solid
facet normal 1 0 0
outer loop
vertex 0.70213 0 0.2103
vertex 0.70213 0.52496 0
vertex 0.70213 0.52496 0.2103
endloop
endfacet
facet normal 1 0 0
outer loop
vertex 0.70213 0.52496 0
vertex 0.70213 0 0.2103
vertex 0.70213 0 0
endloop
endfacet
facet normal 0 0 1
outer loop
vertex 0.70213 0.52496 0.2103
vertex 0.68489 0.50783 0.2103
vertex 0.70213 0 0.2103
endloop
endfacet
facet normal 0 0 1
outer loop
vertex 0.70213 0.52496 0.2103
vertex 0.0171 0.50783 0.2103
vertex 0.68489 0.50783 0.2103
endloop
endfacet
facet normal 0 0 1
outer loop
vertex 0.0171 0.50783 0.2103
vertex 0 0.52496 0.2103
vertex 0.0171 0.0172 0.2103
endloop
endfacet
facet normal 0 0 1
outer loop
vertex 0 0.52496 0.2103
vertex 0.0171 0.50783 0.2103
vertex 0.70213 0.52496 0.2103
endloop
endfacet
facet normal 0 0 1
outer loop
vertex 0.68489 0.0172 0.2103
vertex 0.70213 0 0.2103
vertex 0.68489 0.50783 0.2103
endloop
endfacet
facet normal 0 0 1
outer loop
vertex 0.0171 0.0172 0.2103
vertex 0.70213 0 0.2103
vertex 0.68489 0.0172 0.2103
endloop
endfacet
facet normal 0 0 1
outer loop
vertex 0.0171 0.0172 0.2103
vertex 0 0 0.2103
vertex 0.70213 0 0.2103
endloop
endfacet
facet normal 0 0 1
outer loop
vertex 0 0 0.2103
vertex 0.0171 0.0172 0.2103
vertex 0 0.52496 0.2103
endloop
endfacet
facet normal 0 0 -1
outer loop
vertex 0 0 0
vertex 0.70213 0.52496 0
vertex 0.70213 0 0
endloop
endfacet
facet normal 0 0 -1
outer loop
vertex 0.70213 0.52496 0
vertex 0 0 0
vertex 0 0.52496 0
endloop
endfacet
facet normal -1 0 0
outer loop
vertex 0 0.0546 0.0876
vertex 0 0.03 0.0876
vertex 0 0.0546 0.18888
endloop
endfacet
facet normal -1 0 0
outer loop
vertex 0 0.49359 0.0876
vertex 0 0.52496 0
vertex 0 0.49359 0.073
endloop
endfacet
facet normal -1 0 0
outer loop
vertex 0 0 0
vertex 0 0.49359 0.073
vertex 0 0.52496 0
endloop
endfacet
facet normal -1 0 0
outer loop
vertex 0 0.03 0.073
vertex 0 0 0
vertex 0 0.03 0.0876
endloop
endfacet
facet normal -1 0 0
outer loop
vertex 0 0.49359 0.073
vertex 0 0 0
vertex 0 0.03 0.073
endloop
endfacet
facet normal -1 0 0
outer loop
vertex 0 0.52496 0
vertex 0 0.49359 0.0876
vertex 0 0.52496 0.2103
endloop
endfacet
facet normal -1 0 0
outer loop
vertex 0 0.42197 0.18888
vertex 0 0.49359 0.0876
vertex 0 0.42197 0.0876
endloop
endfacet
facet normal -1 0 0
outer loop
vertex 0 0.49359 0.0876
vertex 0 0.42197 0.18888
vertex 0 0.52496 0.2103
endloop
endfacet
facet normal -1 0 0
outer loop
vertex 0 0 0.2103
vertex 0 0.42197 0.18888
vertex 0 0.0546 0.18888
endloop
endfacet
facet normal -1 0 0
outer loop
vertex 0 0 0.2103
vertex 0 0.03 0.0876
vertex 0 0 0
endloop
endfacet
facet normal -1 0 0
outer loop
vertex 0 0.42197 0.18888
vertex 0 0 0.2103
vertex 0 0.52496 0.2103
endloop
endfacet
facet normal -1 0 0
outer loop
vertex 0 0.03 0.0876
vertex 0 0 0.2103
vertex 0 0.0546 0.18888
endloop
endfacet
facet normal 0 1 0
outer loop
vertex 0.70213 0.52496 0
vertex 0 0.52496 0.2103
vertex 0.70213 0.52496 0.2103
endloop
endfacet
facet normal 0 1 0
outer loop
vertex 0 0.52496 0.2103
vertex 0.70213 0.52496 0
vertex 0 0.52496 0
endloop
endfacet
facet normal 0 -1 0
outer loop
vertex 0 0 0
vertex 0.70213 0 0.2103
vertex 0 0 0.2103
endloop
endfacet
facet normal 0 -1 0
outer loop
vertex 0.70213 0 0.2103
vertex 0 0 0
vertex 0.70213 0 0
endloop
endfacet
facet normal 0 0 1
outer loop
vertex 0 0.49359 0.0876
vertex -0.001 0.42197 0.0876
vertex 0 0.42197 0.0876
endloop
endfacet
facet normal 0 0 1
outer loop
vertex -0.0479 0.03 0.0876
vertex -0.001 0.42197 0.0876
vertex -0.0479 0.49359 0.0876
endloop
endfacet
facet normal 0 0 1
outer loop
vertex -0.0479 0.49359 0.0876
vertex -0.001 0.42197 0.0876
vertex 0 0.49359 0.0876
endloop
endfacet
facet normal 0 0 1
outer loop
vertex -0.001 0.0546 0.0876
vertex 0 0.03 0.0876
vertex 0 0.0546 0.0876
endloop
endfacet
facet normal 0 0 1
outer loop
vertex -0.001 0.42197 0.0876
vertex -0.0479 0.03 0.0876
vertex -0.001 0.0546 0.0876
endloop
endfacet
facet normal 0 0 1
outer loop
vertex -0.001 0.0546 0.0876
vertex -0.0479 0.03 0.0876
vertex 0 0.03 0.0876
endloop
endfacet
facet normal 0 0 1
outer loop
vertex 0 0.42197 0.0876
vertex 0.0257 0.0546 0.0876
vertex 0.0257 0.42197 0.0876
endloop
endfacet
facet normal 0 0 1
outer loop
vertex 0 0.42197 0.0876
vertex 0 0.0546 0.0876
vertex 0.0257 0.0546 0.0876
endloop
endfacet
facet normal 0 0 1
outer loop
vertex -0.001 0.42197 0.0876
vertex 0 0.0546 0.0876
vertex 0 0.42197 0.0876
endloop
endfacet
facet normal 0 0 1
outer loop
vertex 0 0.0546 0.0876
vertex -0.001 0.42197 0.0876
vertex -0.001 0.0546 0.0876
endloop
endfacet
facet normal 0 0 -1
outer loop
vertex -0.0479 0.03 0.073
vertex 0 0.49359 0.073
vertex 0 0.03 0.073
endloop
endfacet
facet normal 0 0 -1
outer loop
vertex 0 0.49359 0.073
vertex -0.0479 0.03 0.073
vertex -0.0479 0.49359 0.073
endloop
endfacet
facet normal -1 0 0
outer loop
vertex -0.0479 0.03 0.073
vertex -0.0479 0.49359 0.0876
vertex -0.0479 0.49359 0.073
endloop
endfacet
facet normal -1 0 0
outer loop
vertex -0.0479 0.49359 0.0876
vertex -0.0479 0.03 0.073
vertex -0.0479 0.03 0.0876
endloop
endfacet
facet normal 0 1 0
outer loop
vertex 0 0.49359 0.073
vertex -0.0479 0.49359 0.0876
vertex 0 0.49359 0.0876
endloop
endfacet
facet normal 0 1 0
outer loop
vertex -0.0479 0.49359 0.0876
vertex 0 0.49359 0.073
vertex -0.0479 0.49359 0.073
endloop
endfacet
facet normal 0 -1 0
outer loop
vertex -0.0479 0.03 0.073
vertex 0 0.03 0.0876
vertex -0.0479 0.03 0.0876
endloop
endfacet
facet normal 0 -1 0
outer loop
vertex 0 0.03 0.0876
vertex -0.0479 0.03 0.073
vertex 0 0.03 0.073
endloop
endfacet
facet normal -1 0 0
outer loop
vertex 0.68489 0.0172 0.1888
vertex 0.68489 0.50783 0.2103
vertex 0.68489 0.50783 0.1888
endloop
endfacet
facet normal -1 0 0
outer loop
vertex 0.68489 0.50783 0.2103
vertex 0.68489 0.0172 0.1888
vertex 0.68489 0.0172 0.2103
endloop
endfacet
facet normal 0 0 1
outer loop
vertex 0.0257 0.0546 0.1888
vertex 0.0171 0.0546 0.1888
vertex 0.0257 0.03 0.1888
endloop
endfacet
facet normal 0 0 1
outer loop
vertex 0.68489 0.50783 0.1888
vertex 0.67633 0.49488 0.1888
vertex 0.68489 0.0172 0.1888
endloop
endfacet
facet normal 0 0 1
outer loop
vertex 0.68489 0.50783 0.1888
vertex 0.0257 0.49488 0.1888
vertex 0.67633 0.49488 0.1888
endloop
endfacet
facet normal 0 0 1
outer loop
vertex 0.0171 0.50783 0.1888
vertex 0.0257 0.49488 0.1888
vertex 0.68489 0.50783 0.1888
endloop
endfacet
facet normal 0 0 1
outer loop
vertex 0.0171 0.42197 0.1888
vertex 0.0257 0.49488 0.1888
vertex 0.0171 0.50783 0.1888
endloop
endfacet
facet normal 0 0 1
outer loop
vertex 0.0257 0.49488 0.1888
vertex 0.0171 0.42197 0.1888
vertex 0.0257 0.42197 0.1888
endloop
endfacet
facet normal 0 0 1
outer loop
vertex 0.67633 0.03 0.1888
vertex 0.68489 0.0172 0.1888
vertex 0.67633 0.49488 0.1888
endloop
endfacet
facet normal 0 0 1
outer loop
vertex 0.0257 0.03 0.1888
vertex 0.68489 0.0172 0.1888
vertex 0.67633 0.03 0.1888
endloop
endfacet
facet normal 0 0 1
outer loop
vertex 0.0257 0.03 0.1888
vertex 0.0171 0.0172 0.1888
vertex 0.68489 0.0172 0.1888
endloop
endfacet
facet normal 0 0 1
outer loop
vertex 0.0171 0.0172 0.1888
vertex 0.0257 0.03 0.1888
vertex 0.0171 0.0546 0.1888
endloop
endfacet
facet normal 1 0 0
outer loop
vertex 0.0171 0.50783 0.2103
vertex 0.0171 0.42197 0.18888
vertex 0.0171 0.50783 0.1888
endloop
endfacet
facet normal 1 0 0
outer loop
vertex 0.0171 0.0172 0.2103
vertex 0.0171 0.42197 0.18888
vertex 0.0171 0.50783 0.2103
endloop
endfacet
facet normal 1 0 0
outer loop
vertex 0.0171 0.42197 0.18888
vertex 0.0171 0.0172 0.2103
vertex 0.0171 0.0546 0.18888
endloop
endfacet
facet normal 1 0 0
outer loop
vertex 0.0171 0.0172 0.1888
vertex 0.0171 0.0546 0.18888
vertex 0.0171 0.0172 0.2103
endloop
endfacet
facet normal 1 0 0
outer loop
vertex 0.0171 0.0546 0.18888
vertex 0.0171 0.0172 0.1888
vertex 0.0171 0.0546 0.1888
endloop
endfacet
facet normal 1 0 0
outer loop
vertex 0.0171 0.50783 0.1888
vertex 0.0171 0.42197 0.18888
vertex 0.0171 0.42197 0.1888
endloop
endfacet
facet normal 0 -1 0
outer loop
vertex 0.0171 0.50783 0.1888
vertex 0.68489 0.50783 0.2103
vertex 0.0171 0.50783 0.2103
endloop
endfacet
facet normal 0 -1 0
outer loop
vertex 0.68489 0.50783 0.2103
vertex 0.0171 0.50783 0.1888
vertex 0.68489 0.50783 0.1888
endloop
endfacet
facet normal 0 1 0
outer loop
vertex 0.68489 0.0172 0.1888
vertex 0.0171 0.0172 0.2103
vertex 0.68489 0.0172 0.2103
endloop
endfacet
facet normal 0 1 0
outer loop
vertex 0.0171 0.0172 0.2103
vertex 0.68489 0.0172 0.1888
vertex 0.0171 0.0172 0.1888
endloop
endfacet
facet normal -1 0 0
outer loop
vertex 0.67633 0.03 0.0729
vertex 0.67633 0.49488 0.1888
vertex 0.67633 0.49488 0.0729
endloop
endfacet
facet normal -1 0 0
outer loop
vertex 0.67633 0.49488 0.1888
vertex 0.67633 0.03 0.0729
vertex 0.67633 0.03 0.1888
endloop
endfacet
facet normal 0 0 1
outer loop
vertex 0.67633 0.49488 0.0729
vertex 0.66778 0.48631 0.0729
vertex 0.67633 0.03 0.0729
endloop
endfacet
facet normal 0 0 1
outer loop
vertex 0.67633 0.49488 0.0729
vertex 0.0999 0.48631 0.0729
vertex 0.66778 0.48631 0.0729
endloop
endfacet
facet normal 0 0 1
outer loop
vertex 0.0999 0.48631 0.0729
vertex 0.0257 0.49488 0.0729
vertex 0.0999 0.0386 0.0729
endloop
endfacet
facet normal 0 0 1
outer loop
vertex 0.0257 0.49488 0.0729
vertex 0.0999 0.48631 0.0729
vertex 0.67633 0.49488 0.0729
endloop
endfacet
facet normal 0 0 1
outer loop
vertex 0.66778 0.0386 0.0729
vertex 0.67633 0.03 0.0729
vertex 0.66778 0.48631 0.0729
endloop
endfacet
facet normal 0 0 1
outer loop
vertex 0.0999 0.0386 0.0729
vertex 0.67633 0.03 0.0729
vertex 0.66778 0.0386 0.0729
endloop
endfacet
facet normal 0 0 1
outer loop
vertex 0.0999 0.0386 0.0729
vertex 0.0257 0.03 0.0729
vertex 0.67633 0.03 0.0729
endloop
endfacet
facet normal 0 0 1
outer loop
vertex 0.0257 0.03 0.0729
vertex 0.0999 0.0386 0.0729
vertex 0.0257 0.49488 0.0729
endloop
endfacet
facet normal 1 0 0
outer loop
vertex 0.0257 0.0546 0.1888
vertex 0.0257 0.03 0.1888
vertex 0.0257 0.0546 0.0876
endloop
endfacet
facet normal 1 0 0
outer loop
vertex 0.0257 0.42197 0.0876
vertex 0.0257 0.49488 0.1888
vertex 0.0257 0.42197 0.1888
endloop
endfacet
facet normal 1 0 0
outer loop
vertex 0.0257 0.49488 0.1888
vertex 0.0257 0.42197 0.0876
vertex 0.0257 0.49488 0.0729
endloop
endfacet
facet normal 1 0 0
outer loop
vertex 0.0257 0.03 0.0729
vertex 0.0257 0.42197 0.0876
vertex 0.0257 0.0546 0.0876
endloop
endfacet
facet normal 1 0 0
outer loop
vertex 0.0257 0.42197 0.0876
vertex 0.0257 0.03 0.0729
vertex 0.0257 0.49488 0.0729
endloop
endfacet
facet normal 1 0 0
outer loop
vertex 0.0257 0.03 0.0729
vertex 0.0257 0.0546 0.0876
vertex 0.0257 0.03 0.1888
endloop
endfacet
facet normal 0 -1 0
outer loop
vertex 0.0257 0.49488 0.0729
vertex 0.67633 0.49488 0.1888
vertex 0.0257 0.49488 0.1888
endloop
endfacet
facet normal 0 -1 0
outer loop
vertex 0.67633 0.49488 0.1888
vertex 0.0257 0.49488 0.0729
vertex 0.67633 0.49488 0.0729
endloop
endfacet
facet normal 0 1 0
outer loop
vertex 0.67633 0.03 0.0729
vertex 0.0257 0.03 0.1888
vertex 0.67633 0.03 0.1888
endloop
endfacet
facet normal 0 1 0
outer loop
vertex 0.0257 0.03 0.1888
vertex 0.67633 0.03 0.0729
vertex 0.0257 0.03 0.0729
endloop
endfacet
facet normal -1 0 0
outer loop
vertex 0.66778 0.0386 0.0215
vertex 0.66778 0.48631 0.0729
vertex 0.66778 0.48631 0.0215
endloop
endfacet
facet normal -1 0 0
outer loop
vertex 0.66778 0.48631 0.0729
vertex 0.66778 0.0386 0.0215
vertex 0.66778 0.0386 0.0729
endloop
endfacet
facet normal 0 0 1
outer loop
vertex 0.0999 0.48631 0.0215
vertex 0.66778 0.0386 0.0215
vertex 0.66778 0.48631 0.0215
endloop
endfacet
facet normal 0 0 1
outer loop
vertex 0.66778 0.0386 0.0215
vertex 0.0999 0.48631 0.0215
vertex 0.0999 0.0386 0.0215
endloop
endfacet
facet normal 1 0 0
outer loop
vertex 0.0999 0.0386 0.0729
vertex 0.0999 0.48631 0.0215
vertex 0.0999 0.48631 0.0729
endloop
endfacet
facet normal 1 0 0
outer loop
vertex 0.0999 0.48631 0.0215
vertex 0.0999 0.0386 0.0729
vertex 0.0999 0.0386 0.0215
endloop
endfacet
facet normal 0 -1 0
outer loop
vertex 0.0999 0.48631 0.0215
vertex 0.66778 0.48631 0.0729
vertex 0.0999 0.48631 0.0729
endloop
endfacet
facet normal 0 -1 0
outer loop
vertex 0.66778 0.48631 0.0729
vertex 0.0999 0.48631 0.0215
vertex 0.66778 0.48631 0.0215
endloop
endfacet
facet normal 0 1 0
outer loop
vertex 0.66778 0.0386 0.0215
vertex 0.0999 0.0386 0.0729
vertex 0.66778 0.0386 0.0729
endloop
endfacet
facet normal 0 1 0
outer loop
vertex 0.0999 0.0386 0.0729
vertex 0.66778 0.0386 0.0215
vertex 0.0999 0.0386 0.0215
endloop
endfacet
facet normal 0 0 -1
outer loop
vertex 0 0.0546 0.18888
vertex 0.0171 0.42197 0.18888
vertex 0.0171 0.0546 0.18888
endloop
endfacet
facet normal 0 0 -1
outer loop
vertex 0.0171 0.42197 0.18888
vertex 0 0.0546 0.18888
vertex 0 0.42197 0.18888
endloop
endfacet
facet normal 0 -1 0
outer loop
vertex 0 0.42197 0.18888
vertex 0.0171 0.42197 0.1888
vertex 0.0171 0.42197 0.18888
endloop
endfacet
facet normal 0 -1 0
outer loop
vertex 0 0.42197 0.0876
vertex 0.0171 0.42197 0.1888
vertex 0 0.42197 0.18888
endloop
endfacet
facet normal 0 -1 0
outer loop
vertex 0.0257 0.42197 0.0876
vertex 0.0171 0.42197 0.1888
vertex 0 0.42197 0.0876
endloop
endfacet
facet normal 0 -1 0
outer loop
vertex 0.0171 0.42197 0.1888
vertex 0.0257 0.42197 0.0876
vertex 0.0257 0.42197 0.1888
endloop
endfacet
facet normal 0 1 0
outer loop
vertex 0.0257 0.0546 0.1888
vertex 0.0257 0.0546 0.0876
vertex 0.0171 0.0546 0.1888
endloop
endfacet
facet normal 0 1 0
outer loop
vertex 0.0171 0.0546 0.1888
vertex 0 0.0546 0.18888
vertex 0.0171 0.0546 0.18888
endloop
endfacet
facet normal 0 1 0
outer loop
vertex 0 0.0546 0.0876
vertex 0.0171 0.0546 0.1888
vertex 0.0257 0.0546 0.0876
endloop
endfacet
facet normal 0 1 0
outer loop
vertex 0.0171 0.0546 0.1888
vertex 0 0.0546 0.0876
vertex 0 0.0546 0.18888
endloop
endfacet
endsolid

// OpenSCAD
// Parameters
// Main reference body
body_length = 0.702127;
body_width  = 0.524964;
body_height = 0.2103;

// Top shallow recess
recess_top_length      = 0.667793;
recess_top_width       = 0.490631;
recess_top_inset_left  = 0.0171;
recess_top_inset_front = 0.0172;
recess_top_z           = 0.1888;
recess_top_depth       = 0.0215;

// Middle contained cut
cut_mid_length      = 0.650626;
cut_mid_width       = 0.46488;
cut_mid_inset_left  = 0.0257;
cut_mid_inset_front = 0.03;
cut_mid_z           = 0.0729;
cut_mid_depth       = 0.1159;

// Lower offset pocket
pocket_low_length      = 0.567882;
pocket_low_width       = 0.447713;
pocket_low_inset_left  = 0.0999;
pocket_low_inset_front = 0.0386;
pocket_low_z           = 0.0215;
pocket_low_depth       = 0.0515;

// Solid rectangular side projection
proj_length      = 0.130618;
proj_width       = 0.463588;
proj_thickness   = 0.0146;
proj_overhang    = 0.0479;
proj_inset_front = 0.03;
proj_z           = 0.073;

// Side recess cut
recess_side_depth       = 0.0343;
recess_side_length      = 0.367372;
recess_side_height      = 0.101285;
recess_side_inset_front = 0.0546;
recess_side_z           = 0.0876;

// Small overlap tolerance for manifold booleans
eps = 0.001;

// Modules
module main_body() {
    cube([body_length, body_width, body_height]);
}

module side_projection() {
    translate([-proj_overhang, proj_inset_front, proj_z])
        cube([proj_length, proj_width, proj_thickness]);
}

module top_shallow_recess() {
    translate([recess_top_inset_left, recess_top_inset_front, recess_top_z])
        cube([recess_top_length, recess_top_width, recess_top_depth + eps]);
}

module middle_cut() {
    translate([cut_mid_inset_left, cut_mid_inset_front, cut_mid_z])
        cube([cut_mid_length, cut_mid_width, cut_mid_depth + eps]);
}

module lower_pocket() {
    translate([pocket_low_inset_left, pocket_low_inset_front, pocket_low_z])
        cube([pocket_low_length, pocket_low_width, pocket_low_depth + eps]);
}

module side_recess() {
    translate([-eps, recess_side_inset_front, recess_side_z])
        cube([recess_side_depth + eps, recess_side_length, recess_side_height]);
}

// Main Model Assembly
difference() {
    // Additive geometry
    union() {
        main_body();
        side_projection();
    }
    // Subtractive features
    top_shallow_recess();
    middle_cut();
    lower_pocket();
    side_recess();
}
